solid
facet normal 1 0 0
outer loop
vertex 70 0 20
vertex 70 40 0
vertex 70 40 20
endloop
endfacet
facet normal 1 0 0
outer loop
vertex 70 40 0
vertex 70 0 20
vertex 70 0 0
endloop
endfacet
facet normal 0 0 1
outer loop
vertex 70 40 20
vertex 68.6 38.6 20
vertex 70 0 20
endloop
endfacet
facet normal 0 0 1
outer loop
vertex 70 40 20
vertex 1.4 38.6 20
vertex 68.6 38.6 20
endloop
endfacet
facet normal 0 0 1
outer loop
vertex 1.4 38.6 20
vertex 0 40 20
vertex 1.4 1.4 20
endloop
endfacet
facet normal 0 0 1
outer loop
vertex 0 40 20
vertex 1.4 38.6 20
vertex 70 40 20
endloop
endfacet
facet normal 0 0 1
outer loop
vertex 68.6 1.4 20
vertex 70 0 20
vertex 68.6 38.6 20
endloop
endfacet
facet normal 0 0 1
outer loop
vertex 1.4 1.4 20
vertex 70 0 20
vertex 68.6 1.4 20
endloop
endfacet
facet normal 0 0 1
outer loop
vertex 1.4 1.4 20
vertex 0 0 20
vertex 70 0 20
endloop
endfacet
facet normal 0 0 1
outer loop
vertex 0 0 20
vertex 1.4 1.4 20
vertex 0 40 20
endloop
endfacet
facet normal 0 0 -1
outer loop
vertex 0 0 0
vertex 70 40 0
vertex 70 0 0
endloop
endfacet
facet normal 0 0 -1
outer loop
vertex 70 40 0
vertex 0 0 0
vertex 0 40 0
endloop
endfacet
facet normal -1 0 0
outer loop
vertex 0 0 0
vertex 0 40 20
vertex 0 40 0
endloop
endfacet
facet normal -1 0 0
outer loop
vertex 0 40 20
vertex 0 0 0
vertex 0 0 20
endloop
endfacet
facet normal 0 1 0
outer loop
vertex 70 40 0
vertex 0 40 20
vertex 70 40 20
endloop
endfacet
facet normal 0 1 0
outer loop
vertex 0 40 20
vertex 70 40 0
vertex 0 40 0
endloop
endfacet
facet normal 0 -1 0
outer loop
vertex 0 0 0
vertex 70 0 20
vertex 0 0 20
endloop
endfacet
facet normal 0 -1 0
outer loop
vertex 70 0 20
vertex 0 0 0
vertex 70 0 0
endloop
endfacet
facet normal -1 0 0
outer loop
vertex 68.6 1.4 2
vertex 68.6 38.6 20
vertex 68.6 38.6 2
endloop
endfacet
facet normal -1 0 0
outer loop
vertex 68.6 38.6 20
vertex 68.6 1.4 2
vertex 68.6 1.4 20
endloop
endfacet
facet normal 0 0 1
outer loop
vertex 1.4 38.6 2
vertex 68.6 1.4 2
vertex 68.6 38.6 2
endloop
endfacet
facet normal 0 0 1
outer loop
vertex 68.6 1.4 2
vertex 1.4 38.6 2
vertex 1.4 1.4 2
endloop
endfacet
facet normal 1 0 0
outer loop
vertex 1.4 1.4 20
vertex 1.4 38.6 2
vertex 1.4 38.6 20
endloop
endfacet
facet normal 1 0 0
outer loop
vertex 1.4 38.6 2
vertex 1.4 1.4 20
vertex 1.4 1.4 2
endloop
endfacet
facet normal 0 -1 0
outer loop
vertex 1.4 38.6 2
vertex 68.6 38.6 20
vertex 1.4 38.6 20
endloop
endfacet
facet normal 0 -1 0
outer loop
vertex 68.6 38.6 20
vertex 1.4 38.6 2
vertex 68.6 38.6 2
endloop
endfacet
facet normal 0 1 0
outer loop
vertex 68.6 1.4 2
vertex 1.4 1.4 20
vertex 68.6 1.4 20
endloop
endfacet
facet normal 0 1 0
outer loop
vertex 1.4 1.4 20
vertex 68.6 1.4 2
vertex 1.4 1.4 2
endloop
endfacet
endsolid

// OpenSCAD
$fn = 32;

// ----------------------------------------------------------------------
// Open box: 1.4 mm walls
// ----------------------------------------------------------------------

// --- parameters (mm) ---
box_l = 70;               // outer length, X
box_w = 40;               // outer width, Y
box_h = 20;               // outer height, Z
wall = 1.4;               // wall thickness
floor = 2;                // floor thickness

difference() {
  cube([box_l, box_w, box_h]);
  translate([wall, wall, floor])
    cube([box_l - 2 * wall, box_w - 2 * wall, box_h]);
}
